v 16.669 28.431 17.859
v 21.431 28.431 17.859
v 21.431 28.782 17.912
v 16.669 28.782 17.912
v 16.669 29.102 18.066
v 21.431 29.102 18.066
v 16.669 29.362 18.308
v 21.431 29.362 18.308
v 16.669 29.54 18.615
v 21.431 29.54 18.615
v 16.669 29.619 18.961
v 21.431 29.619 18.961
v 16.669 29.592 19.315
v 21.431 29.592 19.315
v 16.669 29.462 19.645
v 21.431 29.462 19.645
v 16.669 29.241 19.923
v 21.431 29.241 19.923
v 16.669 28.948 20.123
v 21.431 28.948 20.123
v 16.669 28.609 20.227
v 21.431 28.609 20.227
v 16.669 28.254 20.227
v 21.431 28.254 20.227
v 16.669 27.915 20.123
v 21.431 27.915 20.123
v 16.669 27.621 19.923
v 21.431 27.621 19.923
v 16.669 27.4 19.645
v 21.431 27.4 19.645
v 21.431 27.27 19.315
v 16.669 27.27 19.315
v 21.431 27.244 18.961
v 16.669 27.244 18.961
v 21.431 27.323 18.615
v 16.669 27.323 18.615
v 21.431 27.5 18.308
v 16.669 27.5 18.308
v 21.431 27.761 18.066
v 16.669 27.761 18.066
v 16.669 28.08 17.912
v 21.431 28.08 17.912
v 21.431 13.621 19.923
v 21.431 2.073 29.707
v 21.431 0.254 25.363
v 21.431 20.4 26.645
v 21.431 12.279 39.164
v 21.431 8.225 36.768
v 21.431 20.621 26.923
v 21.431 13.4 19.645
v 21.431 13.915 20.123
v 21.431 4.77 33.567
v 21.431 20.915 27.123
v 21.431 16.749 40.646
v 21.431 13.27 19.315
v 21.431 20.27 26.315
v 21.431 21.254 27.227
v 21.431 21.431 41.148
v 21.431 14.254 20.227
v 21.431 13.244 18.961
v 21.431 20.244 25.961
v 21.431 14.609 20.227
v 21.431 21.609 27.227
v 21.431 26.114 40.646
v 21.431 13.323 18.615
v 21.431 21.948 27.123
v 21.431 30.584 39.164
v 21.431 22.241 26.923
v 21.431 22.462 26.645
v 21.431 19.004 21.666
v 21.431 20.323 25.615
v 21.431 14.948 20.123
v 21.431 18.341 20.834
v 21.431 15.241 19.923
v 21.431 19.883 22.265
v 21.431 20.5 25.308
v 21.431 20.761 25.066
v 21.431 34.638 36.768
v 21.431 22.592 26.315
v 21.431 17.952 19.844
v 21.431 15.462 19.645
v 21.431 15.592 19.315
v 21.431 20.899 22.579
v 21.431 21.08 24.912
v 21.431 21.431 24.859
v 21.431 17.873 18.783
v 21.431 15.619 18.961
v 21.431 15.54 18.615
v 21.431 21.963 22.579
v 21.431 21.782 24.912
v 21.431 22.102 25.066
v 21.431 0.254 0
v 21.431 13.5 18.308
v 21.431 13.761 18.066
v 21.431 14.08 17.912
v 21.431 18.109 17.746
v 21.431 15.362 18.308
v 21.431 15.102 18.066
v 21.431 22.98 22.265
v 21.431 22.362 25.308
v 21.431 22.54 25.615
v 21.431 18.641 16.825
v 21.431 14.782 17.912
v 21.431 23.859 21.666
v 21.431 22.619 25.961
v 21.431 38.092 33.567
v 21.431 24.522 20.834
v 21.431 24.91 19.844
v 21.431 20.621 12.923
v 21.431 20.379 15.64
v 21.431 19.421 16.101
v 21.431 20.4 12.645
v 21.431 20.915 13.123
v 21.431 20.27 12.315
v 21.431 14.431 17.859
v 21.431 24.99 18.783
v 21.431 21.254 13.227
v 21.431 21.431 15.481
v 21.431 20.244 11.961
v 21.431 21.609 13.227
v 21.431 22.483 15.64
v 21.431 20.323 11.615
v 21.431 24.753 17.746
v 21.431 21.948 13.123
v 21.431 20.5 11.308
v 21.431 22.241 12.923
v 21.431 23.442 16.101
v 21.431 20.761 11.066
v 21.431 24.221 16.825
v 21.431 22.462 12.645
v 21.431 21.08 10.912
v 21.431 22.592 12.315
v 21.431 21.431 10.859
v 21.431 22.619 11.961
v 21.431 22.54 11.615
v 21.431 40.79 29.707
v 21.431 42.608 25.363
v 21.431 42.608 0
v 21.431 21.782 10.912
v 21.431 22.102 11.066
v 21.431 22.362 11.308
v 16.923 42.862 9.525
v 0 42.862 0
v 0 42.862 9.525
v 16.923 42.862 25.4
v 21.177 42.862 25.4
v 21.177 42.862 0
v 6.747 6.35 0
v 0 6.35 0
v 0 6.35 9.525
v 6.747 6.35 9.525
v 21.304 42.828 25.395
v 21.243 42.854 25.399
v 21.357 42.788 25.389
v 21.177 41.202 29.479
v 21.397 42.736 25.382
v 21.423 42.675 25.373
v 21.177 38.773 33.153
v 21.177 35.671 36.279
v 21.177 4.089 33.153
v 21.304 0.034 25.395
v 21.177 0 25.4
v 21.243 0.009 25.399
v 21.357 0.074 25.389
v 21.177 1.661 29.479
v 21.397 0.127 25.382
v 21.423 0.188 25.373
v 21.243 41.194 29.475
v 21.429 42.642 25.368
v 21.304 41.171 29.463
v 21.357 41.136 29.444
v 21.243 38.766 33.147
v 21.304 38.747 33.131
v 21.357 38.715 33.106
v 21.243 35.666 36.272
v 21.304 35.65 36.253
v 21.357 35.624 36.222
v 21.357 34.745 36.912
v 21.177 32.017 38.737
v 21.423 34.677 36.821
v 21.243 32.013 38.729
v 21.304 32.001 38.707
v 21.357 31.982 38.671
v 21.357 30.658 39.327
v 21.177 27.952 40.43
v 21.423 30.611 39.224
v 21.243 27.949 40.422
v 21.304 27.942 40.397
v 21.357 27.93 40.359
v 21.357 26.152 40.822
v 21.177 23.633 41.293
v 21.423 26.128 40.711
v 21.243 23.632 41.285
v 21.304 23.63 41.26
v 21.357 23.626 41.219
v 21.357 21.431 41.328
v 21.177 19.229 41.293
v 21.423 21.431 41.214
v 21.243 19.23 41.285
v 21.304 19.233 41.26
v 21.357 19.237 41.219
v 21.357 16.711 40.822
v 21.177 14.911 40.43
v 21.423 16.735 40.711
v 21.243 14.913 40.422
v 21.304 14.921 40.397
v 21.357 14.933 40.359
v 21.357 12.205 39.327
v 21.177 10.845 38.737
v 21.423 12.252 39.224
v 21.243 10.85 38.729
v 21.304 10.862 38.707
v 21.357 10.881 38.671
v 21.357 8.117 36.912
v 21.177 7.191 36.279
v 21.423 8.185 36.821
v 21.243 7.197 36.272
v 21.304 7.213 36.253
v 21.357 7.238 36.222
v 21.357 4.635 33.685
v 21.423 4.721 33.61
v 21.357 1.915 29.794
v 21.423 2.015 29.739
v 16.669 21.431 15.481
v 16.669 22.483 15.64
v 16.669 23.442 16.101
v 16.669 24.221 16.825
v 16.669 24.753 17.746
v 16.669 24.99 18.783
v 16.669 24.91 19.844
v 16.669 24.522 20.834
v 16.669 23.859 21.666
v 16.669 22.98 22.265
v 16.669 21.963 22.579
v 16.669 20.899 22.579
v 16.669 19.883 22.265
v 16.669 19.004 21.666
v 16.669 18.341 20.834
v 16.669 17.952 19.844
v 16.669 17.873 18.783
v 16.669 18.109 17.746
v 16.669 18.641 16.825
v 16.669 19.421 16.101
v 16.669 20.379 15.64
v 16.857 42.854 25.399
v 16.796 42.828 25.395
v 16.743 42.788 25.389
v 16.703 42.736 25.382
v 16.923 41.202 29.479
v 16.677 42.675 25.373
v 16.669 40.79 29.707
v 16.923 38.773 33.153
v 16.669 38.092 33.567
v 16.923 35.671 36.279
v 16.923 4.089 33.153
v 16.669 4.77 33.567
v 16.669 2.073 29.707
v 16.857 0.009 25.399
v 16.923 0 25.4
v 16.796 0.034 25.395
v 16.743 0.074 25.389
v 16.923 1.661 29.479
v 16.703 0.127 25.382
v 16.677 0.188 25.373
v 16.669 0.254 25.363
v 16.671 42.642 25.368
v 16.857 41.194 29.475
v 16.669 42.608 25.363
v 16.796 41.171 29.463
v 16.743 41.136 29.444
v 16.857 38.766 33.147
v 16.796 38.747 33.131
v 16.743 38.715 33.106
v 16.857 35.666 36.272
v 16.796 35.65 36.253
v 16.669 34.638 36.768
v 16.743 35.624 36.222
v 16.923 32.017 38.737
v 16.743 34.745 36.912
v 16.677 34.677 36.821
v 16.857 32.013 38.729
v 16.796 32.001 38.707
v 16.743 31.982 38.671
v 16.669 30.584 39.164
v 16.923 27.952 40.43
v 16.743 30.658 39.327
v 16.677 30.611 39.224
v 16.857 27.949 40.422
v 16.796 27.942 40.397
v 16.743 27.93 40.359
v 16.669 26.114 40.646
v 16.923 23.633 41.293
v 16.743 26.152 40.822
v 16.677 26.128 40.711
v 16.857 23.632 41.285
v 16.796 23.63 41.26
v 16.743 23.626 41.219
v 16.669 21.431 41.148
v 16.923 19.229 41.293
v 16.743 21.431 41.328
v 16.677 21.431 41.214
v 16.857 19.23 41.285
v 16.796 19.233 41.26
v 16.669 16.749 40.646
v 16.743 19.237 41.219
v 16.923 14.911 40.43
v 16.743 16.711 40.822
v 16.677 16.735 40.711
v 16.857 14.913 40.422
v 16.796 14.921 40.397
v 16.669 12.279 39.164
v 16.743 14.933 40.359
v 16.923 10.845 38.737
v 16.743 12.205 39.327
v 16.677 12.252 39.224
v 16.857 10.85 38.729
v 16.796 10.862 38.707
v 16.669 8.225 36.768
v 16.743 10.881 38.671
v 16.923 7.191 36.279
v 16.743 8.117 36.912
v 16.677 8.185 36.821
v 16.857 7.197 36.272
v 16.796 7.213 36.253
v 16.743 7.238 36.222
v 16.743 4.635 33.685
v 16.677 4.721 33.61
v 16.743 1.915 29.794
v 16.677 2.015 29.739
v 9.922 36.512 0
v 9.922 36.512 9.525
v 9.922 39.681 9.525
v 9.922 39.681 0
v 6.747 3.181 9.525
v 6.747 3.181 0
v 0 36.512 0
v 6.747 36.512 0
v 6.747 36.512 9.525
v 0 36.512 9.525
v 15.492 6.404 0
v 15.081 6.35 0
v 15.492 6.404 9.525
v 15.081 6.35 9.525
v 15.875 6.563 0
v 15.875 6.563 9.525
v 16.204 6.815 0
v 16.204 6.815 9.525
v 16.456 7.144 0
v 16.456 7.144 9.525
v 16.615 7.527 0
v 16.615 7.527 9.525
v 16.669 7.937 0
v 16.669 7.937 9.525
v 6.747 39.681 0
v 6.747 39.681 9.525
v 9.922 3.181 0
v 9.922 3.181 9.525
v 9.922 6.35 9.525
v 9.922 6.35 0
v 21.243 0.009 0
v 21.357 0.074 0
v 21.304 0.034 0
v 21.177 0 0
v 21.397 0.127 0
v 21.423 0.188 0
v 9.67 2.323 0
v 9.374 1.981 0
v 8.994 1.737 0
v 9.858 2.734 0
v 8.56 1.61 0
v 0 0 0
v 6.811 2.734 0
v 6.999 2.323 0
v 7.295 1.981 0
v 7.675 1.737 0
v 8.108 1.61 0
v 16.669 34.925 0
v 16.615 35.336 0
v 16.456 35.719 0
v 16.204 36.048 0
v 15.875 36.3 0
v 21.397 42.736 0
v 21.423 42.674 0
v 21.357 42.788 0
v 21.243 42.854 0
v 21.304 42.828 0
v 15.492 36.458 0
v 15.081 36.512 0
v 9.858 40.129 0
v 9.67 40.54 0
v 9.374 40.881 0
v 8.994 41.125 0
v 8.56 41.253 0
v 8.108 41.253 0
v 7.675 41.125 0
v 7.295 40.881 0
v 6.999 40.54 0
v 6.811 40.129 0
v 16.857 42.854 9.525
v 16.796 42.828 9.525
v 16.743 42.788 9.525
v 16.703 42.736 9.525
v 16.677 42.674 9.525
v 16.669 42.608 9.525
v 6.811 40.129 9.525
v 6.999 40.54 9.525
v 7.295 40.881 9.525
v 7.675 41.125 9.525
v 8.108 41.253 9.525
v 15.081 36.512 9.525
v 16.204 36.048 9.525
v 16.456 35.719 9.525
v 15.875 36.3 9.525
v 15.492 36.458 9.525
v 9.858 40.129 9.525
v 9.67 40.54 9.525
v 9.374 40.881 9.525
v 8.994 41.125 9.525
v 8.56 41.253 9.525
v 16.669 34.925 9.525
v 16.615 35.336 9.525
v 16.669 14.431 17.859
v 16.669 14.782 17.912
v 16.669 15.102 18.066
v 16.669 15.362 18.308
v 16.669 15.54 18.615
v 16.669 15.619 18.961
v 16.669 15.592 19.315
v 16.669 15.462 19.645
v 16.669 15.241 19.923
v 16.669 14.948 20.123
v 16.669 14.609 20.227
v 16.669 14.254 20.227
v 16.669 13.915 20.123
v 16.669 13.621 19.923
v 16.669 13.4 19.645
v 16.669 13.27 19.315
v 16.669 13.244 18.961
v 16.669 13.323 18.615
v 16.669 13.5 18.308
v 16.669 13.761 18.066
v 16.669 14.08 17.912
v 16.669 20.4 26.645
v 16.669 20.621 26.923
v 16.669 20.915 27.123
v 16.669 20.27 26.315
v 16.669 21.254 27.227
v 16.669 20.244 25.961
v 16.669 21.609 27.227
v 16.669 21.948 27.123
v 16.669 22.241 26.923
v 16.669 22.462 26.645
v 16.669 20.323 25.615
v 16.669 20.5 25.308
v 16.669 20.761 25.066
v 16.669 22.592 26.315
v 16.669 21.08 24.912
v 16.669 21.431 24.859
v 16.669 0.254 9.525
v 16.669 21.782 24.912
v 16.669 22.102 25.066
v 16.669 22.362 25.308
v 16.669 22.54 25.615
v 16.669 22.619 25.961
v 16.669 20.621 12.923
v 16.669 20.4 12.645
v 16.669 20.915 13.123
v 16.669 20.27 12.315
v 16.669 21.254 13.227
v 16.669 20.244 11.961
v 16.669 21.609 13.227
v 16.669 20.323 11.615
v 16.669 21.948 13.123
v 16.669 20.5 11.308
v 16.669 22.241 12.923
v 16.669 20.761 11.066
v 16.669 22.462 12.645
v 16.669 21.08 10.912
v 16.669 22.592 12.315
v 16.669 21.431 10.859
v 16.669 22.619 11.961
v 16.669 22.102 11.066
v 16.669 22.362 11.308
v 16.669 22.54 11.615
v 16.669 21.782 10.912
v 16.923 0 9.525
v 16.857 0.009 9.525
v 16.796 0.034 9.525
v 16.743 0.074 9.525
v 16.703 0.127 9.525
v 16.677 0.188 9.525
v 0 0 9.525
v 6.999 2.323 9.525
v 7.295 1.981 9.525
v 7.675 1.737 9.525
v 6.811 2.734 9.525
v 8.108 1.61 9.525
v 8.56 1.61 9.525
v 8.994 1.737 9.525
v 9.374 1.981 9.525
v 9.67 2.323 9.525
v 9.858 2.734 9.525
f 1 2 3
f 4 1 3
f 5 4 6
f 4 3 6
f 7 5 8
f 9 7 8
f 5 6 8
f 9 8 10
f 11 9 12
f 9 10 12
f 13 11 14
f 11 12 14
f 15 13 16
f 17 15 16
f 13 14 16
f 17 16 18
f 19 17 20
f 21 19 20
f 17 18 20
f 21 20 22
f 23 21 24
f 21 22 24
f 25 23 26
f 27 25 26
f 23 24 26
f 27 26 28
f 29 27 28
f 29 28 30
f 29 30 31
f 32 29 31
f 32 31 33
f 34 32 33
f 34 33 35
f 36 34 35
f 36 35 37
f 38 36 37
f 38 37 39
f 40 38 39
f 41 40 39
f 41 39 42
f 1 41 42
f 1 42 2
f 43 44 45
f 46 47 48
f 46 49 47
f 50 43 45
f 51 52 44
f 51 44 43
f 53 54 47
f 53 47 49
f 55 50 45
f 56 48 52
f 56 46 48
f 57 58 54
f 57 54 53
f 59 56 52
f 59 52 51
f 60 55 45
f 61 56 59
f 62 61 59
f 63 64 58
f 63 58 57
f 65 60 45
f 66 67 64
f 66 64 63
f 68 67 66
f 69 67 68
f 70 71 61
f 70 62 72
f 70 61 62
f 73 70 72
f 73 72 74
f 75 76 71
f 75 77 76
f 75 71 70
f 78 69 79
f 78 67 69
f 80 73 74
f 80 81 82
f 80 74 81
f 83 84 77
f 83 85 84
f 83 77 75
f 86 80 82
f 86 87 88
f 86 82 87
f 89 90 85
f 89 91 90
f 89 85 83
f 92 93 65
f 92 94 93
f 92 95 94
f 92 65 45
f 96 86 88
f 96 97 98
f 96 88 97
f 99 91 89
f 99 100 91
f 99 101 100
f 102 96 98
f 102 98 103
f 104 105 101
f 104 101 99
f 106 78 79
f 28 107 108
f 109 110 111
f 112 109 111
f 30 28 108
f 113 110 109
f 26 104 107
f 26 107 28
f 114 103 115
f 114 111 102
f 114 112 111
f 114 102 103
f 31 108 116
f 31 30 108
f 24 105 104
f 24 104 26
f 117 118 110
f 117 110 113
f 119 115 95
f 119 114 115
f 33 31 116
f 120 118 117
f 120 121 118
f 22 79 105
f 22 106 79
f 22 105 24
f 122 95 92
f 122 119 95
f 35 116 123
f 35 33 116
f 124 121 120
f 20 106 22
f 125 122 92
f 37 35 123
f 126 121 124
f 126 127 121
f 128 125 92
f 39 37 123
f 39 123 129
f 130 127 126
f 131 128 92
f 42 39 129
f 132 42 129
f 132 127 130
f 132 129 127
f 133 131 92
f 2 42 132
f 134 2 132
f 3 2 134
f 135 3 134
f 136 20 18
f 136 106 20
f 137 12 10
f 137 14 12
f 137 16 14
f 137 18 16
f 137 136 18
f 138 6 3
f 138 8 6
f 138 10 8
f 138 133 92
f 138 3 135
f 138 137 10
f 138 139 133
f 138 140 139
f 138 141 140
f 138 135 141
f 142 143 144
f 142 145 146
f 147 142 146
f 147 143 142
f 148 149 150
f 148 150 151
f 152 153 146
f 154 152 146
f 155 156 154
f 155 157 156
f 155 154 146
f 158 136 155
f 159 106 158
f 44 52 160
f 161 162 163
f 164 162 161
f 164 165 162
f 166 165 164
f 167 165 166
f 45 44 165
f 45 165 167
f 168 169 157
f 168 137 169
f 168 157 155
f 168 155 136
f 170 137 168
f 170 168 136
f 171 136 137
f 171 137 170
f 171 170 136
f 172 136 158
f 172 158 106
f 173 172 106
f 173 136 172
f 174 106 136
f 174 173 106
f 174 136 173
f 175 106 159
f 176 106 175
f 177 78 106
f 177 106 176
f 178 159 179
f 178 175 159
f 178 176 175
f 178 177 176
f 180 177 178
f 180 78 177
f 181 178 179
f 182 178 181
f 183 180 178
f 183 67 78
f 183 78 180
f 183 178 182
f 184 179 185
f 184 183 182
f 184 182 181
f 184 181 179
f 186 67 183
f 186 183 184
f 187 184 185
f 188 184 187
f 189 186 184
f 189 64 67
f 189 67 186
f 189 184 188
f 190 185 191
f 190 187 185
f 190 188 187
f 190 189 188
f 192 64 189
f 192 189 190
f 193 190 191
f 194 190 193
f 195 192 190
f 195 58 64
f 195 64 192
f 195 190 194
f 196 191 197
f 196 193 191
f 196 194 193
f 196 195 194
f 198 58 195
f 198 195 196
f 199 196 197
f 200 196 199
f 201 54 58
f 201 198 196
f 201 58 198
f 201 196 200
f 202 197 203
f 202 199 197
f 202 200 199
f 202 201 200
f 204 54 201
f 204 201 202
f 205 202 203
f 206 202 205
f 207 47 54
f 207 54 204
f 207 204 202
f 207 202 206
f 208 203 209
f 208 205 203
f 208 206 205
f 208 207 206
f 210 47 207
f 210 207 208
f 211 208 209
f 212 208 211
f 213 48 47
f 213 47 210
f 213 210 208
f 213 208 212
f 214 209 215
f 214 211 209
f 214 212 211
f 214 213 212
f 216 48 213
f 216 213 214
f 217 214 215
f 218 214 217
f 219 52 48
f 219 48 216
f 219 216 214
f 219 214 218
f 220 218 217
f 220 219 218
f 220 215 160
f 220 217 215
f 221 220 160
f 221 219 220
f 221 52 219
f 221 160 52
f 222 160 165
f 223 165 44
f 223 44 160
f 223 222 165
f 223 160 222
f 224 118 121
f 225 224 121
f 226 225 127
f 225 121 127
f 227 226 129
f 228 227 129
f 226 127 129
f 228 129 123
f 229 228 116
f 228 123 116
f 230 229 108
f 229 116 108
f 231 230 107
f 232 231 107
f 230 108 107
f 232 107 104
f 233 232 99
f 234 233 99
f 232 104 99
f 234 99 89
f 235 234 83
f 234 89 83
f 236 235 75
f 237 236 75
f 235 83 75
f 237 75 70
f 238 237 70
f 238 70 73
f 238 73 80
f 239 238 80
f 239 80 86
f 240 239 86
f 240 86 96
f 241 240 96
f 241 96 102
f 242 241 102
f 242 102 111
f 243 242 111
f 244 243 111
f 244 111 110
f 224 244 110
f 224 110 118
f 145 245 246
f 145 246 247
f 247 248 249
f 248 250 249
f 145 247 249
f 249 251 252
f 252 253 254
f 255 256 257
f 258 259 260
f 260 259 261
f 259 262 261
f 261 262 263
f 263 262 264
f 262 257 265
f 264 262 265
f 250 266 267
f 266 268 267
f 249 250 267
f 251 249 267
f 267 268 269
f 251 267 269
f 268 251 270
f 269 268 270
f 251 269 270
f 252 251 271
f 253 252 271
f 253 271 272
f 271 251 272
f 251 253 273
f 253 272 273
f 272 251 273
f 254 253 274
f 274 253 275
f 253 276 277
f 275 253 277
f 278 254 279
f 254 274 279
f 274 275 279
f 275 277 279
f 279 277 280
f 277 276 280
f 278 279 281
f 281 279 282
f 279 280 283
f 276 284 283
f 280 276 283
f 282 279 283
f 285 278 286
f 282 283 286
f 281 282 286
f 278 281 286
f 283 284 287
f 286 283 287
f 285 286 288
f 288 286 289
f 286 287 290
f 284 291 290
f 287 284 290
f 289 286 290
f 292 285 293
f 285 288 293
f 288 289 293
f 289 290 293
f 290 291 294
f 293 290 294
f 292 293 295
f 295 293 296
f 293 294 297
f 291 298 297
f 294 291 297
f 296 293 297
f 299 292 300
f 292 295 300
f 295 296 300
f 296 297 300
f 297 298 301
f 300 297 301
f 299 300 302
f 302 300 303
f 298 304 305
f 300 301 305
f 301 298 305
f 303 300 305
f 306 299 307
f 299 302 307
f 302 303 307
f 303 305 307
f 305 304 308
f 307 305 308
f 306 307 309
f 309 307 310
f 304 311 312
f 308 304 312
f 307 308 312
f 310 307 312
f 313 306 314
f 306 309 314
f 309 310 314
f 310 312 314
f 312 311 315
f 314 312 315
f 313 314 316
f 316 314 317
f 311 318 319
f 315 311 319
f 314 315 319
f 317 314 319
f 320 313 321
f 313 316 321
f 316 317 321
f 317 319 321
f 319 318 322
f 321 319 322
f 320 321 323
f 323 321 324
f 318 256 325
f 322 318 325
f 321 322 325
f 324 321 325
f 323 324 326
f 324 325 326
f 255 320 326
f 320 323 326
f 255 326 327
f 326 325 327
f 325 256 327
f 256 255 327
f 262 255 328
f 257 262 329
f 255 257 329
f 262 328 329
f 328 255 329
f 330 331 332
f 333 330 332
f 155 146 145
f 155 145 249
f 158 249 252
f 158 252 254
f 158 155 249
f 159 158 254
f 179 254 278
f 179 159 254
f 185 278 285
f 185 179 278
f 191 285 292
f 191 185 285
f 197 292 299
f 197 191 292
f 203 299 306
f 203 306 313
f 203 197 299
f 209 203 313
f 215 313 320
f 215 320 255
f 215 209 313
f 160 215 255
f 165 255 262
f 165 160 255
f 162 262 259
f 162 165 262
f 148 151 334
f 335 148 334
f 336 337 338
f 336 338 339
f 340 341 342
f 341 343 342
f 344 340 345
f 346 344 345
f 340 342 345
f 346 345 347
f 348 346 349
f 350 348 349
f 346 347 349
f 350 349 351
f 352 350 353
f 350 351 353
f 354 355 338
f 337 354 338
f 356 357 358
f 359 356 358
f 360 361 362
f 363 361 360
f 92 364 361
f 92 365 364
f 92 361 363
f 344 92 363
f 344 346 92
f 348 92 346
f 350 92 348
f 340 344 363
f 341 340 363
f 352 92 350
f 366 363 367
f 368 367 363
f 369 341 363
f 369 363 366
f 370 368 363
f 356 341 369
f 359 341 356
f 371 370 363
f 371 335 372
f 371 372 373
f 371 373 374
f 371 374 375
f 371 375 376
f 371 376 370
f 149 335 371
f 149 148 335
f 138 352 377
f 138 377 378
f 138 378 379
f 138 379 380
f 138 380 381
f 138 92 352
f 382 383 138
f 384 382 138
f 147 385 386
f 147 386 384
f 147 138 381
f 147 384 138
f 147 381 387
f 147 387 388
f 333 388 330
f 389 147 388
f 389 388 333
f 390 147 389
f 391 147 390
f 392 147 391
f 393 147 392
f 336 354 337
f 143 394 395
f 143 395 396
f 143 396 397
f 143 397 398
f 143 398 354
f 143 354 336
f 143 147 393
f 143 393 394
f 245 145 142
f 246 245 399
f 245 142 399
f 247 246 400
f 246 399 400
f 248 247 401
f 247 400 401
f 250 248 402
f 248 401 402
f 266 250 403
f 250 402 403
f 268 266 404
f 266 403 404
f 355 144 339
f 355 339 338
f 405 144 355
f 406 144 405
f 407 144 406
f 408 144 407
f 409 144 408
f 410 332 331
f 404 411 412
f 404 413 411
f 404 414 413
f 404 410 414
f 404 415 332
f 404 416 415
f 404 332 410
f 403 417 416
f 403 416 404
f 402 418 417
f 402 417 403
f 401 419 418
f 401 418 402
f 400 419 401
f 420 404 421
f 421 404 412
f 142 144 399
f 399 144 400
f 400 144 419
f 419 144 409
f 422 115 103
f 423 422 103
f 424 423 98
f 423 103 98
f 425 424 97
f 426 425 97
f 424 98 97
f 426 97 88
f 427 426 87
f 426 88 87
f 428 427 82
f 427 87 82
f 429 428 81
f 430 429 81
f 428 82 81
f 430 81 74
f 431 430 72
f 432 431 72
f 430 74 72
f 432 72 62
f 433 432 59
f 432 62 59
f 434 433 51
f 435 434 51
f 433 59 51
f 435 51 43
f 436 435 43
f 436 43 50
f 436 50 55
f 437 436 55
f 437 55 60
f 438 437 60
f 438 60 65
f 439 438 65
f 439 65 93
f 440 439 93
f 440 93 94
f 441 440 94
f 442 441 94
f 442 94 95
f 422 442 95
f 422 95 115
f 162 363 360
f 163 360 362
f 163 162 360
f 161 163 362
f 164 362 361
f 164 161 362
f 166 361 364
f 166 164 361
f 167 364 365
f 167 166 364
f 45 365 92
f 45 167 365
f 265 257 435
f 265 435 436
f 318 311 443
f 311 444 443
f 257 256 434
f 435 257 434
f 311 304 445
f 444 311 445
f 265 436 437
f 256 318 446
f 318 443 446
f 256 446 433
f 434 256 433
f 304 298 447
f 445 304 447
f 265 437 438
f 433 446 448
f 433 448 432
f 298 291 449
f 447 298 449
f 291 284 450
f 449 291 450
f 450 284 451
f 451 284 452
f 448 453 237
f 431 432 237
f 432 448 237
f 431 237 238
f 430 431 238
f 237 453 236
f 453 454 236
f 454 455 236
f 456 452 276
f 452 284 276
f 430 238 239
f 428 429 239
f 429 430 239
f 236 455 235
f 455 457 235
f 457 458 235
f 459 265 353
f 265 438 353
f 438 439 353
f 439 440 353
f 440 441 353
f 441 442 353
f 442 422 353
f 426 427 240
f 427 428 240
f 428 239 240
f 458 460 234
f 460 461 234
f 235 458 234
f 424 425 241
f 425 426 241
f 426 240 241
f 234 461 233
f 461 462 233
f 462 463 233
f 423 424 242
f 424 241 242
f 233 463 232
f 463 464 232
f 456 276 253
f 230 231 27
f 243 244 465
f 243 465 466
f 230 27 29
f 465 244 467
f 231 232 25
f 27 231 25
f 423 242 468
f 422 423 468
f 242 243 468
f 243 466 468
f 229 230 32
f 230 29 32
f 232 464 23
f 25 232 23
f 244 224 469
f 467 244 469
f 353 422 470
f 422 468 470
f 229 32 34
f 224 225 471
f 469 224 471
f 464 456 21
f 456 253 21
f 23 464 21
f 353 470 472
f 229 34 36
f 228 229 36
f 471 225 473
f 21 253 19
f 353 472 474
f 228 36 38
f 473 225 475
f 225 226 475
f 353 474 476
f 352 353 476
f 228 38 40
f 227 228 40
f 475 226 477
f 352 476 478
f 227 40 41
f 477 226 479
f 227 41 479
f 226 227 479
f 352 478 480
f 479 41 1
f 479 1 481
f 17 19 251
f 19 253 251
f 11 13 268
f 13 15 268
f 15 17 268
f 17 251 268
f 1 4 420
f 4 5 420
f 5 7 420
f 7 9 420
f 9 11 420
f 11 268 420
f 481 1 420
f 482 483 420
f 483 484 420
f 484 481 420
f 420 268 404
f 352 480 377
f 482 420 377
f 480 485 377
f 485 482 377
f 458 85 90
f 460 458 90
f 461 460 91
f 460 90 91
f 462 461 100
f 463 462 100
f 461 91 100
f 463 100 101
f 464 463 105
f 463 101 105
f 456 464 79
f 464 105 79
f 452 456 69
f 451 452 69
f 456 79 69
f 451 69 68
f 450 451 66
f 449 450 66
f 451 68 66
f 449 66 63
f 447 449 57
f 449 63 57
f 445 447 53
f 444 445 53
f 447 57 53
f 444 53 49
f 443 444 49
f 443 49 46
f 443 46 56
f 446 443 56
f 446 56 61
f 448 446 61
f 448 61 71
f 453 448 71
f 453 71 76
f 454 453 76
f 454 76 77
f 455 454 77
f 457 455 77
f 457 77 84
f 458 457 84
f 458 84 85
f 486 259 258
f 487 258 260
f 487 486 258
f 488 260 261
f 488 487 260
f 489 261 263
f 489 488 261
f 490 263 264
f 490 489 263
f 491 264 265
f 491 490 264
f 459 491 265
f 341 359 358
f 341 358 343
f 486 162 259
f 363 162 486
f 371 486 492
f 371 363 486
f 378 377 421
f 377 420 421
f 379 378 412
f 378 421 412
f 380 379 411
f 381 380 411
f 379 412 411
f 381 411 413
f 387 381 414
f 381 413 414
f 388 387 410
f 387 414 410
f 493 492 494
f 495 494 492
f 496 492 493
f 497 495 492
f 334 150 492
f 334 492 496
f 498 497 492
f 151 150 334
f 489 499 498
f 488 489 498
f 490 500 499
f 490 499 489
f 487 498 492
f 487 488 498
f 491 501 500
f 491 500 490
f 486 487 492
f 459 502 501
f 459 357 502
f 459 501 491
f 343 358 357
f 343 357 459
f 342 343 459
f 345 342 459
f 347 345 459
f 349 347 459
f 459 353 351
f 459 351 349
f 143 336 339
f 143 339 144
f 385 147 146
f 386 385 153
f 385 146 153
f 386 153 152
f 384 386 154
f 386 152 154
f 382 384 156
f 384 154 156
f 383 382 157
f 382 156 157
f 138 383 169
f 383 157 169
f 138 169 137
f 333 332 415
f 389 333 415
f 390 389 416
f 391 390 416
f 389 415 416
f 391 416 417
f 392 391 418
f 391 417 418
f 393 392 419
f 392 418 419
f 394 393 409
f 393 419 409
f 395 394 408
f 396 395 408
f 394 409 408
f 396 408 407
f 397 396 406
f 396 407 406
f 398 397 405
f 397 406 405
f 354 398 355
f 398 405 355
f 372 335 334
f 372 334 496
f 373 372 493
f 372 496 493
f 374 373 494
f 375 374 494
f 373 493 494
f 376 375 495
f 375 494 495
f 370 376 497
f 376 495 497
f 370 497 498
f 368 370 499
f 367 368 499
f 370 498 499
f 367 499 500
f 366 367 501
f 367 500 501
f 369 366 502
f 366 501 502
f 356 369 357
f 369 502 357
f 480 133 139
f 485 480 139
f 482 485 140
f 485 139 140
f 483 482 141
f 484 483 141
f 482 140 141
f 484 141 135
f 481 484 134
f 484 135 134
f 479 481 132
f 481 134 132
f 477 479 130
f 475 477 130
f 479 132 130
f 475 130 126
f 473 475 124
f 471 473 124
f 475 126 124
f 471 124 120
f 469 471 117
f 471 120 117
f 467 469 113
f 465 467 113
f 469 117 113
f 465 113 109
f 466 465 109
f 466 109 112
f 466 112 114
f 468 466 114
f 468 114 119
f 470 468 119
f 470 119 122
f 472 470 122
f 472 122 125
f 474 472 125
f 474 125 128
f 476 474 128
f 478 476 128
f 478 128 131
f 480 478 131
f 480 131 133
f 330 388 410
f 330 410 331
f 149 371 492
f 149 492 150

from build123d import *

# Parameters (mm, degrees)
BOSS_EXTRUDE1_DEPTH = 25.4
CUT_EXTRUDE1_REACH  = 56.237
SKETCH3_R           = 3.5687
CUT_EXTRUDE2_REACH  = 56.237
SKETCH5_W           = 16.66875
SKETCH5_H           = 42.8625
CUT_EXTRUDE3_DEPTH  = 15.875
BOSS_EXTRUDE2_DEPTH = 4.7625
CUT_EXTRUDE5_REACH  = 65.33
SKETCH9_R           = 1.190625
FILLET1_R           = 0.254
FILLET2_R           = 1.5875


with BuildPart() as part:
    # Sketch2 → Boss-Extrude1 (new body)
    with BuildSketch(Plane.XY):
        Polygon((0, 0), (0, 6.35), (16.66875, 6.35), (16.66875, 36.5125), (0, 36.5125), (0, 42.8625), (21.43125, 42.8625), (21.43125, 0), align=None)
    extrude(amount=BOSS_EXTRUDE1_DEPTH)

    # Sketch3 → Cut-Extrude1 (cut, up to next)
    with BuildSketch(Plane(origin=(21.43125, 0, 0), x_dir=(0, 0, -1), z_dir=(1, 0, 0)), mode=Mode.PRIVATE) as cut_extrude1_sk1:
        with Locations((-19.05, 21.43125)):
            Circle(SKETCH3_R)
    cut_extrude1_tool1 = extrude(cut_extrude1_sk1.sketch, amount=-CUT_EXTRUDE1_REACH, mode=Mode.PRIVATE) & part.part
    add(cut_extrude1_tool1.solids().sort_by_distance((21.43125, 21.43125, 19.05))[0], mode=Mode.SUBTRACT)

    # Sketch4 → Cut-Extrude2 (cut, up to next)
    with BuildSketch(Plane.XY.offset(25.4), mode=Mode.PRIVATE) as cut_extrude2_sk1:
        with BuildLine():
            Line((9.921875, 3.18125), (9.921875, 6.35))
            Line((9.921875, 6.35), (6.746875, 6.35))
            Line((6.746875, 6.35), (6.746875, 3.18125))
            ThreePointArc((6.746875, 3.18125), (8.334375, 1.59375), (9.921875, 3.18125))
        make_face()
    cut_extrude2_tool1 = extrude(cut_extrude2_sk1.sketch, amount=-CUT_EXTRUDE2_REACH, mode=Mode.PRIVATE) & part.part
    # Sketch4 → Cut-Extrude2 (cut, up to next)
    with BuildSketch(Plane.XY.offset(25.4), mode=Mode.PRIVATE) as cut_extrude2_sk2:
        with BuildLine():
            Line((6.746875, 36.5125), (9.921875, 36.5125))
            Line((9.921875, 36.5125), (9.921875, 39.68125))
            ThreePointArc((9.921875, 39.68125), (8.334375, 41.26875), (6.746875, 39.68125))
            Line((6.746875, 39.68125), (6.746875, 36.5125))
        make_face()
    cut_extrude2_tool2 = extrude(cut_extrude2_sk2.sketch, amount=-CUT_EXTRUDE2_REACH, mode=Mode.PRIVATE) & part.part
    add(cut_extrude2_tool1.solids().sort_by_distance((8.334375, 4.127999, 25.4))[0], mode=Mode.SUBTRACT)
    add(cut_extrude2_tool2.solids().sort_by_distance((8.334375, 38.734501, 25.4))[0], mode=Mode.SUBTRACT)

    # Sketch5 → Cut-Extrude3 (cut)
    with BuildSketch(Plane.XY.offset(25.4)):
        with Locations((8.334375, 21.43125)):
            Rectangle(SKETCH5_W, SKETCH5_H)
    extrude(amount=-CUT_EXTRUDE3_DEPTH, mode=Mode.SUBTRACT)

    # Sketch6 → Boss-Extrude2 (add)
    with BuildSketch(Plane(origin=(21.43125, 0, 0), x_dir=(0, 0, -1), z_dir=(1, 0, 0))):
        with BuildLine():
            ThreePointArc((-25.4, 42.8625), (-41.402202947, 21.43125), (-25.4, 0))
            Line((-25.4, 0), (-25.4, 42.8625))
        make_face()
    extrude(amount=-BOSS_EXTRUDE2_DEPTH)

    # Sketch9 → Cut-Extrude5 (cut, up to next)
    with BuildSketch(Plane(origin=(21.43125, 0, 0), x_dir=(0, 0, -1), z_dir=(1, 0, 0)), mode=Mode.PRIVATE) as cut_extrude5_sk1:
        with Locations((-12.05, 21.43125)):
            Circle(SKETCH9_R)
    cut_extrude5_tool1 = extrude(cut_extrude5_sk1.sketch, amount=-CUT_EXTRUDE5_REACH, mode=Mode.PRIVATE) & part.part
    # Sketch9 → Cut-Extrude5 (cut, up to next)
    with BuildSketch(Plane(origin=(21.43125, 0, 0), x_dir=(0, 0, -1), z_dir=(1, 0, 0)), mode=Mode.PRIVATE) as cut_extrude5_sk2:
        with Locations((-19.05, 14.43125)):
            Circle(SKETCH9_R)
    cut_extrude5_tool2 = extrude(cut_extrude5_sk2.sketch, amount=-CUT_EXTRUDE5_REACH, mode=Mode.PRIVATE) & part.part
    # Sketch9 → Cut-Extrude5 (cut, up to next)
    with BuildSketch(Plane(origin=(21.43125, 0, 0), x_dir=(0, 0, -1), z_dir=(1, 0, 0)), mode=Mode.PRIVATE) as cut_extrude5_sk3:
        with Locations((-26.05, 21.43125)):
            Circle(SKETCH9_R)
    cut_extrude5_tool3 = extrude(cut_extrude5_sk3.sketch, amount=-CUT_EXTRUDE5_REACH, mode=Mode.PRIVATE) & part.part
    # Sketch9 → Cut-Extrude5 (cut, up to next)
    with BuildSketch(Plane(origin=(21.43125, 0, 0), x_dir=(0, 0, -1), z_dir=(1, 0, 0)), mode=Mode.PRIVATE) as cut_extrude5_sk4:
        with Locations((-19.05, 28.43125)):
            Circle(SKETCH9_R)
    cut_extrude5_tool4 = extrude(cut_extrude5_sk4.sketch, amount=-CUT_EXTRUDE5_REACH, mode=Mode.PRIVATE) & part.part
    add(cut_extrude5_tool1.solids().sort_by_distance((21.43125, 21.43125, 12.05))[0], mode=Mode.SUBTRACT)
    add(cut_extrude5_tool2.solids().sort_by_distance((21.43125, 14.43125, 19.05))[0], mode=Mode.SUBTRACT)
    add(cut_extrude5_tool3.solids().sort_by_distance((21.43125, 21.43125, 26.05))[0], mode=Mode.SUBTRACT)
    add(cut_extrude5_tool4.solids().sort_by_distance((21.43125, 28.43125, 19.05))[0], mode=Mode.SUBTRACT)

    # Fillet1
    fillet1_edges = [part.edges().sort_by_distance(p)[0] for p in [
        (21.43125, 21.43125, 41.402202947),
        (16.66875, 21.43125, 41.402202947),
        (21.43125, 42.8625, 12.7),
        (21.43125, 0, 12.7),
        (16.66875, 42.8625, 17.4625),
        (16.66875, 0, 17.4625),
    ]]
    fillet(fillet1_edges, radius=FILLET1_R)

    # Fillet2
    fillet2_edges = [part.edges().sort_by_distance(p)[0] for p in [
        (16.66875, 6.35, 4.7625),
        (16.66875, 36.5125, 4.7625),
    ]]
    fillet(fillet2_edges, radius=FILLET2_R)


solid = part.part
